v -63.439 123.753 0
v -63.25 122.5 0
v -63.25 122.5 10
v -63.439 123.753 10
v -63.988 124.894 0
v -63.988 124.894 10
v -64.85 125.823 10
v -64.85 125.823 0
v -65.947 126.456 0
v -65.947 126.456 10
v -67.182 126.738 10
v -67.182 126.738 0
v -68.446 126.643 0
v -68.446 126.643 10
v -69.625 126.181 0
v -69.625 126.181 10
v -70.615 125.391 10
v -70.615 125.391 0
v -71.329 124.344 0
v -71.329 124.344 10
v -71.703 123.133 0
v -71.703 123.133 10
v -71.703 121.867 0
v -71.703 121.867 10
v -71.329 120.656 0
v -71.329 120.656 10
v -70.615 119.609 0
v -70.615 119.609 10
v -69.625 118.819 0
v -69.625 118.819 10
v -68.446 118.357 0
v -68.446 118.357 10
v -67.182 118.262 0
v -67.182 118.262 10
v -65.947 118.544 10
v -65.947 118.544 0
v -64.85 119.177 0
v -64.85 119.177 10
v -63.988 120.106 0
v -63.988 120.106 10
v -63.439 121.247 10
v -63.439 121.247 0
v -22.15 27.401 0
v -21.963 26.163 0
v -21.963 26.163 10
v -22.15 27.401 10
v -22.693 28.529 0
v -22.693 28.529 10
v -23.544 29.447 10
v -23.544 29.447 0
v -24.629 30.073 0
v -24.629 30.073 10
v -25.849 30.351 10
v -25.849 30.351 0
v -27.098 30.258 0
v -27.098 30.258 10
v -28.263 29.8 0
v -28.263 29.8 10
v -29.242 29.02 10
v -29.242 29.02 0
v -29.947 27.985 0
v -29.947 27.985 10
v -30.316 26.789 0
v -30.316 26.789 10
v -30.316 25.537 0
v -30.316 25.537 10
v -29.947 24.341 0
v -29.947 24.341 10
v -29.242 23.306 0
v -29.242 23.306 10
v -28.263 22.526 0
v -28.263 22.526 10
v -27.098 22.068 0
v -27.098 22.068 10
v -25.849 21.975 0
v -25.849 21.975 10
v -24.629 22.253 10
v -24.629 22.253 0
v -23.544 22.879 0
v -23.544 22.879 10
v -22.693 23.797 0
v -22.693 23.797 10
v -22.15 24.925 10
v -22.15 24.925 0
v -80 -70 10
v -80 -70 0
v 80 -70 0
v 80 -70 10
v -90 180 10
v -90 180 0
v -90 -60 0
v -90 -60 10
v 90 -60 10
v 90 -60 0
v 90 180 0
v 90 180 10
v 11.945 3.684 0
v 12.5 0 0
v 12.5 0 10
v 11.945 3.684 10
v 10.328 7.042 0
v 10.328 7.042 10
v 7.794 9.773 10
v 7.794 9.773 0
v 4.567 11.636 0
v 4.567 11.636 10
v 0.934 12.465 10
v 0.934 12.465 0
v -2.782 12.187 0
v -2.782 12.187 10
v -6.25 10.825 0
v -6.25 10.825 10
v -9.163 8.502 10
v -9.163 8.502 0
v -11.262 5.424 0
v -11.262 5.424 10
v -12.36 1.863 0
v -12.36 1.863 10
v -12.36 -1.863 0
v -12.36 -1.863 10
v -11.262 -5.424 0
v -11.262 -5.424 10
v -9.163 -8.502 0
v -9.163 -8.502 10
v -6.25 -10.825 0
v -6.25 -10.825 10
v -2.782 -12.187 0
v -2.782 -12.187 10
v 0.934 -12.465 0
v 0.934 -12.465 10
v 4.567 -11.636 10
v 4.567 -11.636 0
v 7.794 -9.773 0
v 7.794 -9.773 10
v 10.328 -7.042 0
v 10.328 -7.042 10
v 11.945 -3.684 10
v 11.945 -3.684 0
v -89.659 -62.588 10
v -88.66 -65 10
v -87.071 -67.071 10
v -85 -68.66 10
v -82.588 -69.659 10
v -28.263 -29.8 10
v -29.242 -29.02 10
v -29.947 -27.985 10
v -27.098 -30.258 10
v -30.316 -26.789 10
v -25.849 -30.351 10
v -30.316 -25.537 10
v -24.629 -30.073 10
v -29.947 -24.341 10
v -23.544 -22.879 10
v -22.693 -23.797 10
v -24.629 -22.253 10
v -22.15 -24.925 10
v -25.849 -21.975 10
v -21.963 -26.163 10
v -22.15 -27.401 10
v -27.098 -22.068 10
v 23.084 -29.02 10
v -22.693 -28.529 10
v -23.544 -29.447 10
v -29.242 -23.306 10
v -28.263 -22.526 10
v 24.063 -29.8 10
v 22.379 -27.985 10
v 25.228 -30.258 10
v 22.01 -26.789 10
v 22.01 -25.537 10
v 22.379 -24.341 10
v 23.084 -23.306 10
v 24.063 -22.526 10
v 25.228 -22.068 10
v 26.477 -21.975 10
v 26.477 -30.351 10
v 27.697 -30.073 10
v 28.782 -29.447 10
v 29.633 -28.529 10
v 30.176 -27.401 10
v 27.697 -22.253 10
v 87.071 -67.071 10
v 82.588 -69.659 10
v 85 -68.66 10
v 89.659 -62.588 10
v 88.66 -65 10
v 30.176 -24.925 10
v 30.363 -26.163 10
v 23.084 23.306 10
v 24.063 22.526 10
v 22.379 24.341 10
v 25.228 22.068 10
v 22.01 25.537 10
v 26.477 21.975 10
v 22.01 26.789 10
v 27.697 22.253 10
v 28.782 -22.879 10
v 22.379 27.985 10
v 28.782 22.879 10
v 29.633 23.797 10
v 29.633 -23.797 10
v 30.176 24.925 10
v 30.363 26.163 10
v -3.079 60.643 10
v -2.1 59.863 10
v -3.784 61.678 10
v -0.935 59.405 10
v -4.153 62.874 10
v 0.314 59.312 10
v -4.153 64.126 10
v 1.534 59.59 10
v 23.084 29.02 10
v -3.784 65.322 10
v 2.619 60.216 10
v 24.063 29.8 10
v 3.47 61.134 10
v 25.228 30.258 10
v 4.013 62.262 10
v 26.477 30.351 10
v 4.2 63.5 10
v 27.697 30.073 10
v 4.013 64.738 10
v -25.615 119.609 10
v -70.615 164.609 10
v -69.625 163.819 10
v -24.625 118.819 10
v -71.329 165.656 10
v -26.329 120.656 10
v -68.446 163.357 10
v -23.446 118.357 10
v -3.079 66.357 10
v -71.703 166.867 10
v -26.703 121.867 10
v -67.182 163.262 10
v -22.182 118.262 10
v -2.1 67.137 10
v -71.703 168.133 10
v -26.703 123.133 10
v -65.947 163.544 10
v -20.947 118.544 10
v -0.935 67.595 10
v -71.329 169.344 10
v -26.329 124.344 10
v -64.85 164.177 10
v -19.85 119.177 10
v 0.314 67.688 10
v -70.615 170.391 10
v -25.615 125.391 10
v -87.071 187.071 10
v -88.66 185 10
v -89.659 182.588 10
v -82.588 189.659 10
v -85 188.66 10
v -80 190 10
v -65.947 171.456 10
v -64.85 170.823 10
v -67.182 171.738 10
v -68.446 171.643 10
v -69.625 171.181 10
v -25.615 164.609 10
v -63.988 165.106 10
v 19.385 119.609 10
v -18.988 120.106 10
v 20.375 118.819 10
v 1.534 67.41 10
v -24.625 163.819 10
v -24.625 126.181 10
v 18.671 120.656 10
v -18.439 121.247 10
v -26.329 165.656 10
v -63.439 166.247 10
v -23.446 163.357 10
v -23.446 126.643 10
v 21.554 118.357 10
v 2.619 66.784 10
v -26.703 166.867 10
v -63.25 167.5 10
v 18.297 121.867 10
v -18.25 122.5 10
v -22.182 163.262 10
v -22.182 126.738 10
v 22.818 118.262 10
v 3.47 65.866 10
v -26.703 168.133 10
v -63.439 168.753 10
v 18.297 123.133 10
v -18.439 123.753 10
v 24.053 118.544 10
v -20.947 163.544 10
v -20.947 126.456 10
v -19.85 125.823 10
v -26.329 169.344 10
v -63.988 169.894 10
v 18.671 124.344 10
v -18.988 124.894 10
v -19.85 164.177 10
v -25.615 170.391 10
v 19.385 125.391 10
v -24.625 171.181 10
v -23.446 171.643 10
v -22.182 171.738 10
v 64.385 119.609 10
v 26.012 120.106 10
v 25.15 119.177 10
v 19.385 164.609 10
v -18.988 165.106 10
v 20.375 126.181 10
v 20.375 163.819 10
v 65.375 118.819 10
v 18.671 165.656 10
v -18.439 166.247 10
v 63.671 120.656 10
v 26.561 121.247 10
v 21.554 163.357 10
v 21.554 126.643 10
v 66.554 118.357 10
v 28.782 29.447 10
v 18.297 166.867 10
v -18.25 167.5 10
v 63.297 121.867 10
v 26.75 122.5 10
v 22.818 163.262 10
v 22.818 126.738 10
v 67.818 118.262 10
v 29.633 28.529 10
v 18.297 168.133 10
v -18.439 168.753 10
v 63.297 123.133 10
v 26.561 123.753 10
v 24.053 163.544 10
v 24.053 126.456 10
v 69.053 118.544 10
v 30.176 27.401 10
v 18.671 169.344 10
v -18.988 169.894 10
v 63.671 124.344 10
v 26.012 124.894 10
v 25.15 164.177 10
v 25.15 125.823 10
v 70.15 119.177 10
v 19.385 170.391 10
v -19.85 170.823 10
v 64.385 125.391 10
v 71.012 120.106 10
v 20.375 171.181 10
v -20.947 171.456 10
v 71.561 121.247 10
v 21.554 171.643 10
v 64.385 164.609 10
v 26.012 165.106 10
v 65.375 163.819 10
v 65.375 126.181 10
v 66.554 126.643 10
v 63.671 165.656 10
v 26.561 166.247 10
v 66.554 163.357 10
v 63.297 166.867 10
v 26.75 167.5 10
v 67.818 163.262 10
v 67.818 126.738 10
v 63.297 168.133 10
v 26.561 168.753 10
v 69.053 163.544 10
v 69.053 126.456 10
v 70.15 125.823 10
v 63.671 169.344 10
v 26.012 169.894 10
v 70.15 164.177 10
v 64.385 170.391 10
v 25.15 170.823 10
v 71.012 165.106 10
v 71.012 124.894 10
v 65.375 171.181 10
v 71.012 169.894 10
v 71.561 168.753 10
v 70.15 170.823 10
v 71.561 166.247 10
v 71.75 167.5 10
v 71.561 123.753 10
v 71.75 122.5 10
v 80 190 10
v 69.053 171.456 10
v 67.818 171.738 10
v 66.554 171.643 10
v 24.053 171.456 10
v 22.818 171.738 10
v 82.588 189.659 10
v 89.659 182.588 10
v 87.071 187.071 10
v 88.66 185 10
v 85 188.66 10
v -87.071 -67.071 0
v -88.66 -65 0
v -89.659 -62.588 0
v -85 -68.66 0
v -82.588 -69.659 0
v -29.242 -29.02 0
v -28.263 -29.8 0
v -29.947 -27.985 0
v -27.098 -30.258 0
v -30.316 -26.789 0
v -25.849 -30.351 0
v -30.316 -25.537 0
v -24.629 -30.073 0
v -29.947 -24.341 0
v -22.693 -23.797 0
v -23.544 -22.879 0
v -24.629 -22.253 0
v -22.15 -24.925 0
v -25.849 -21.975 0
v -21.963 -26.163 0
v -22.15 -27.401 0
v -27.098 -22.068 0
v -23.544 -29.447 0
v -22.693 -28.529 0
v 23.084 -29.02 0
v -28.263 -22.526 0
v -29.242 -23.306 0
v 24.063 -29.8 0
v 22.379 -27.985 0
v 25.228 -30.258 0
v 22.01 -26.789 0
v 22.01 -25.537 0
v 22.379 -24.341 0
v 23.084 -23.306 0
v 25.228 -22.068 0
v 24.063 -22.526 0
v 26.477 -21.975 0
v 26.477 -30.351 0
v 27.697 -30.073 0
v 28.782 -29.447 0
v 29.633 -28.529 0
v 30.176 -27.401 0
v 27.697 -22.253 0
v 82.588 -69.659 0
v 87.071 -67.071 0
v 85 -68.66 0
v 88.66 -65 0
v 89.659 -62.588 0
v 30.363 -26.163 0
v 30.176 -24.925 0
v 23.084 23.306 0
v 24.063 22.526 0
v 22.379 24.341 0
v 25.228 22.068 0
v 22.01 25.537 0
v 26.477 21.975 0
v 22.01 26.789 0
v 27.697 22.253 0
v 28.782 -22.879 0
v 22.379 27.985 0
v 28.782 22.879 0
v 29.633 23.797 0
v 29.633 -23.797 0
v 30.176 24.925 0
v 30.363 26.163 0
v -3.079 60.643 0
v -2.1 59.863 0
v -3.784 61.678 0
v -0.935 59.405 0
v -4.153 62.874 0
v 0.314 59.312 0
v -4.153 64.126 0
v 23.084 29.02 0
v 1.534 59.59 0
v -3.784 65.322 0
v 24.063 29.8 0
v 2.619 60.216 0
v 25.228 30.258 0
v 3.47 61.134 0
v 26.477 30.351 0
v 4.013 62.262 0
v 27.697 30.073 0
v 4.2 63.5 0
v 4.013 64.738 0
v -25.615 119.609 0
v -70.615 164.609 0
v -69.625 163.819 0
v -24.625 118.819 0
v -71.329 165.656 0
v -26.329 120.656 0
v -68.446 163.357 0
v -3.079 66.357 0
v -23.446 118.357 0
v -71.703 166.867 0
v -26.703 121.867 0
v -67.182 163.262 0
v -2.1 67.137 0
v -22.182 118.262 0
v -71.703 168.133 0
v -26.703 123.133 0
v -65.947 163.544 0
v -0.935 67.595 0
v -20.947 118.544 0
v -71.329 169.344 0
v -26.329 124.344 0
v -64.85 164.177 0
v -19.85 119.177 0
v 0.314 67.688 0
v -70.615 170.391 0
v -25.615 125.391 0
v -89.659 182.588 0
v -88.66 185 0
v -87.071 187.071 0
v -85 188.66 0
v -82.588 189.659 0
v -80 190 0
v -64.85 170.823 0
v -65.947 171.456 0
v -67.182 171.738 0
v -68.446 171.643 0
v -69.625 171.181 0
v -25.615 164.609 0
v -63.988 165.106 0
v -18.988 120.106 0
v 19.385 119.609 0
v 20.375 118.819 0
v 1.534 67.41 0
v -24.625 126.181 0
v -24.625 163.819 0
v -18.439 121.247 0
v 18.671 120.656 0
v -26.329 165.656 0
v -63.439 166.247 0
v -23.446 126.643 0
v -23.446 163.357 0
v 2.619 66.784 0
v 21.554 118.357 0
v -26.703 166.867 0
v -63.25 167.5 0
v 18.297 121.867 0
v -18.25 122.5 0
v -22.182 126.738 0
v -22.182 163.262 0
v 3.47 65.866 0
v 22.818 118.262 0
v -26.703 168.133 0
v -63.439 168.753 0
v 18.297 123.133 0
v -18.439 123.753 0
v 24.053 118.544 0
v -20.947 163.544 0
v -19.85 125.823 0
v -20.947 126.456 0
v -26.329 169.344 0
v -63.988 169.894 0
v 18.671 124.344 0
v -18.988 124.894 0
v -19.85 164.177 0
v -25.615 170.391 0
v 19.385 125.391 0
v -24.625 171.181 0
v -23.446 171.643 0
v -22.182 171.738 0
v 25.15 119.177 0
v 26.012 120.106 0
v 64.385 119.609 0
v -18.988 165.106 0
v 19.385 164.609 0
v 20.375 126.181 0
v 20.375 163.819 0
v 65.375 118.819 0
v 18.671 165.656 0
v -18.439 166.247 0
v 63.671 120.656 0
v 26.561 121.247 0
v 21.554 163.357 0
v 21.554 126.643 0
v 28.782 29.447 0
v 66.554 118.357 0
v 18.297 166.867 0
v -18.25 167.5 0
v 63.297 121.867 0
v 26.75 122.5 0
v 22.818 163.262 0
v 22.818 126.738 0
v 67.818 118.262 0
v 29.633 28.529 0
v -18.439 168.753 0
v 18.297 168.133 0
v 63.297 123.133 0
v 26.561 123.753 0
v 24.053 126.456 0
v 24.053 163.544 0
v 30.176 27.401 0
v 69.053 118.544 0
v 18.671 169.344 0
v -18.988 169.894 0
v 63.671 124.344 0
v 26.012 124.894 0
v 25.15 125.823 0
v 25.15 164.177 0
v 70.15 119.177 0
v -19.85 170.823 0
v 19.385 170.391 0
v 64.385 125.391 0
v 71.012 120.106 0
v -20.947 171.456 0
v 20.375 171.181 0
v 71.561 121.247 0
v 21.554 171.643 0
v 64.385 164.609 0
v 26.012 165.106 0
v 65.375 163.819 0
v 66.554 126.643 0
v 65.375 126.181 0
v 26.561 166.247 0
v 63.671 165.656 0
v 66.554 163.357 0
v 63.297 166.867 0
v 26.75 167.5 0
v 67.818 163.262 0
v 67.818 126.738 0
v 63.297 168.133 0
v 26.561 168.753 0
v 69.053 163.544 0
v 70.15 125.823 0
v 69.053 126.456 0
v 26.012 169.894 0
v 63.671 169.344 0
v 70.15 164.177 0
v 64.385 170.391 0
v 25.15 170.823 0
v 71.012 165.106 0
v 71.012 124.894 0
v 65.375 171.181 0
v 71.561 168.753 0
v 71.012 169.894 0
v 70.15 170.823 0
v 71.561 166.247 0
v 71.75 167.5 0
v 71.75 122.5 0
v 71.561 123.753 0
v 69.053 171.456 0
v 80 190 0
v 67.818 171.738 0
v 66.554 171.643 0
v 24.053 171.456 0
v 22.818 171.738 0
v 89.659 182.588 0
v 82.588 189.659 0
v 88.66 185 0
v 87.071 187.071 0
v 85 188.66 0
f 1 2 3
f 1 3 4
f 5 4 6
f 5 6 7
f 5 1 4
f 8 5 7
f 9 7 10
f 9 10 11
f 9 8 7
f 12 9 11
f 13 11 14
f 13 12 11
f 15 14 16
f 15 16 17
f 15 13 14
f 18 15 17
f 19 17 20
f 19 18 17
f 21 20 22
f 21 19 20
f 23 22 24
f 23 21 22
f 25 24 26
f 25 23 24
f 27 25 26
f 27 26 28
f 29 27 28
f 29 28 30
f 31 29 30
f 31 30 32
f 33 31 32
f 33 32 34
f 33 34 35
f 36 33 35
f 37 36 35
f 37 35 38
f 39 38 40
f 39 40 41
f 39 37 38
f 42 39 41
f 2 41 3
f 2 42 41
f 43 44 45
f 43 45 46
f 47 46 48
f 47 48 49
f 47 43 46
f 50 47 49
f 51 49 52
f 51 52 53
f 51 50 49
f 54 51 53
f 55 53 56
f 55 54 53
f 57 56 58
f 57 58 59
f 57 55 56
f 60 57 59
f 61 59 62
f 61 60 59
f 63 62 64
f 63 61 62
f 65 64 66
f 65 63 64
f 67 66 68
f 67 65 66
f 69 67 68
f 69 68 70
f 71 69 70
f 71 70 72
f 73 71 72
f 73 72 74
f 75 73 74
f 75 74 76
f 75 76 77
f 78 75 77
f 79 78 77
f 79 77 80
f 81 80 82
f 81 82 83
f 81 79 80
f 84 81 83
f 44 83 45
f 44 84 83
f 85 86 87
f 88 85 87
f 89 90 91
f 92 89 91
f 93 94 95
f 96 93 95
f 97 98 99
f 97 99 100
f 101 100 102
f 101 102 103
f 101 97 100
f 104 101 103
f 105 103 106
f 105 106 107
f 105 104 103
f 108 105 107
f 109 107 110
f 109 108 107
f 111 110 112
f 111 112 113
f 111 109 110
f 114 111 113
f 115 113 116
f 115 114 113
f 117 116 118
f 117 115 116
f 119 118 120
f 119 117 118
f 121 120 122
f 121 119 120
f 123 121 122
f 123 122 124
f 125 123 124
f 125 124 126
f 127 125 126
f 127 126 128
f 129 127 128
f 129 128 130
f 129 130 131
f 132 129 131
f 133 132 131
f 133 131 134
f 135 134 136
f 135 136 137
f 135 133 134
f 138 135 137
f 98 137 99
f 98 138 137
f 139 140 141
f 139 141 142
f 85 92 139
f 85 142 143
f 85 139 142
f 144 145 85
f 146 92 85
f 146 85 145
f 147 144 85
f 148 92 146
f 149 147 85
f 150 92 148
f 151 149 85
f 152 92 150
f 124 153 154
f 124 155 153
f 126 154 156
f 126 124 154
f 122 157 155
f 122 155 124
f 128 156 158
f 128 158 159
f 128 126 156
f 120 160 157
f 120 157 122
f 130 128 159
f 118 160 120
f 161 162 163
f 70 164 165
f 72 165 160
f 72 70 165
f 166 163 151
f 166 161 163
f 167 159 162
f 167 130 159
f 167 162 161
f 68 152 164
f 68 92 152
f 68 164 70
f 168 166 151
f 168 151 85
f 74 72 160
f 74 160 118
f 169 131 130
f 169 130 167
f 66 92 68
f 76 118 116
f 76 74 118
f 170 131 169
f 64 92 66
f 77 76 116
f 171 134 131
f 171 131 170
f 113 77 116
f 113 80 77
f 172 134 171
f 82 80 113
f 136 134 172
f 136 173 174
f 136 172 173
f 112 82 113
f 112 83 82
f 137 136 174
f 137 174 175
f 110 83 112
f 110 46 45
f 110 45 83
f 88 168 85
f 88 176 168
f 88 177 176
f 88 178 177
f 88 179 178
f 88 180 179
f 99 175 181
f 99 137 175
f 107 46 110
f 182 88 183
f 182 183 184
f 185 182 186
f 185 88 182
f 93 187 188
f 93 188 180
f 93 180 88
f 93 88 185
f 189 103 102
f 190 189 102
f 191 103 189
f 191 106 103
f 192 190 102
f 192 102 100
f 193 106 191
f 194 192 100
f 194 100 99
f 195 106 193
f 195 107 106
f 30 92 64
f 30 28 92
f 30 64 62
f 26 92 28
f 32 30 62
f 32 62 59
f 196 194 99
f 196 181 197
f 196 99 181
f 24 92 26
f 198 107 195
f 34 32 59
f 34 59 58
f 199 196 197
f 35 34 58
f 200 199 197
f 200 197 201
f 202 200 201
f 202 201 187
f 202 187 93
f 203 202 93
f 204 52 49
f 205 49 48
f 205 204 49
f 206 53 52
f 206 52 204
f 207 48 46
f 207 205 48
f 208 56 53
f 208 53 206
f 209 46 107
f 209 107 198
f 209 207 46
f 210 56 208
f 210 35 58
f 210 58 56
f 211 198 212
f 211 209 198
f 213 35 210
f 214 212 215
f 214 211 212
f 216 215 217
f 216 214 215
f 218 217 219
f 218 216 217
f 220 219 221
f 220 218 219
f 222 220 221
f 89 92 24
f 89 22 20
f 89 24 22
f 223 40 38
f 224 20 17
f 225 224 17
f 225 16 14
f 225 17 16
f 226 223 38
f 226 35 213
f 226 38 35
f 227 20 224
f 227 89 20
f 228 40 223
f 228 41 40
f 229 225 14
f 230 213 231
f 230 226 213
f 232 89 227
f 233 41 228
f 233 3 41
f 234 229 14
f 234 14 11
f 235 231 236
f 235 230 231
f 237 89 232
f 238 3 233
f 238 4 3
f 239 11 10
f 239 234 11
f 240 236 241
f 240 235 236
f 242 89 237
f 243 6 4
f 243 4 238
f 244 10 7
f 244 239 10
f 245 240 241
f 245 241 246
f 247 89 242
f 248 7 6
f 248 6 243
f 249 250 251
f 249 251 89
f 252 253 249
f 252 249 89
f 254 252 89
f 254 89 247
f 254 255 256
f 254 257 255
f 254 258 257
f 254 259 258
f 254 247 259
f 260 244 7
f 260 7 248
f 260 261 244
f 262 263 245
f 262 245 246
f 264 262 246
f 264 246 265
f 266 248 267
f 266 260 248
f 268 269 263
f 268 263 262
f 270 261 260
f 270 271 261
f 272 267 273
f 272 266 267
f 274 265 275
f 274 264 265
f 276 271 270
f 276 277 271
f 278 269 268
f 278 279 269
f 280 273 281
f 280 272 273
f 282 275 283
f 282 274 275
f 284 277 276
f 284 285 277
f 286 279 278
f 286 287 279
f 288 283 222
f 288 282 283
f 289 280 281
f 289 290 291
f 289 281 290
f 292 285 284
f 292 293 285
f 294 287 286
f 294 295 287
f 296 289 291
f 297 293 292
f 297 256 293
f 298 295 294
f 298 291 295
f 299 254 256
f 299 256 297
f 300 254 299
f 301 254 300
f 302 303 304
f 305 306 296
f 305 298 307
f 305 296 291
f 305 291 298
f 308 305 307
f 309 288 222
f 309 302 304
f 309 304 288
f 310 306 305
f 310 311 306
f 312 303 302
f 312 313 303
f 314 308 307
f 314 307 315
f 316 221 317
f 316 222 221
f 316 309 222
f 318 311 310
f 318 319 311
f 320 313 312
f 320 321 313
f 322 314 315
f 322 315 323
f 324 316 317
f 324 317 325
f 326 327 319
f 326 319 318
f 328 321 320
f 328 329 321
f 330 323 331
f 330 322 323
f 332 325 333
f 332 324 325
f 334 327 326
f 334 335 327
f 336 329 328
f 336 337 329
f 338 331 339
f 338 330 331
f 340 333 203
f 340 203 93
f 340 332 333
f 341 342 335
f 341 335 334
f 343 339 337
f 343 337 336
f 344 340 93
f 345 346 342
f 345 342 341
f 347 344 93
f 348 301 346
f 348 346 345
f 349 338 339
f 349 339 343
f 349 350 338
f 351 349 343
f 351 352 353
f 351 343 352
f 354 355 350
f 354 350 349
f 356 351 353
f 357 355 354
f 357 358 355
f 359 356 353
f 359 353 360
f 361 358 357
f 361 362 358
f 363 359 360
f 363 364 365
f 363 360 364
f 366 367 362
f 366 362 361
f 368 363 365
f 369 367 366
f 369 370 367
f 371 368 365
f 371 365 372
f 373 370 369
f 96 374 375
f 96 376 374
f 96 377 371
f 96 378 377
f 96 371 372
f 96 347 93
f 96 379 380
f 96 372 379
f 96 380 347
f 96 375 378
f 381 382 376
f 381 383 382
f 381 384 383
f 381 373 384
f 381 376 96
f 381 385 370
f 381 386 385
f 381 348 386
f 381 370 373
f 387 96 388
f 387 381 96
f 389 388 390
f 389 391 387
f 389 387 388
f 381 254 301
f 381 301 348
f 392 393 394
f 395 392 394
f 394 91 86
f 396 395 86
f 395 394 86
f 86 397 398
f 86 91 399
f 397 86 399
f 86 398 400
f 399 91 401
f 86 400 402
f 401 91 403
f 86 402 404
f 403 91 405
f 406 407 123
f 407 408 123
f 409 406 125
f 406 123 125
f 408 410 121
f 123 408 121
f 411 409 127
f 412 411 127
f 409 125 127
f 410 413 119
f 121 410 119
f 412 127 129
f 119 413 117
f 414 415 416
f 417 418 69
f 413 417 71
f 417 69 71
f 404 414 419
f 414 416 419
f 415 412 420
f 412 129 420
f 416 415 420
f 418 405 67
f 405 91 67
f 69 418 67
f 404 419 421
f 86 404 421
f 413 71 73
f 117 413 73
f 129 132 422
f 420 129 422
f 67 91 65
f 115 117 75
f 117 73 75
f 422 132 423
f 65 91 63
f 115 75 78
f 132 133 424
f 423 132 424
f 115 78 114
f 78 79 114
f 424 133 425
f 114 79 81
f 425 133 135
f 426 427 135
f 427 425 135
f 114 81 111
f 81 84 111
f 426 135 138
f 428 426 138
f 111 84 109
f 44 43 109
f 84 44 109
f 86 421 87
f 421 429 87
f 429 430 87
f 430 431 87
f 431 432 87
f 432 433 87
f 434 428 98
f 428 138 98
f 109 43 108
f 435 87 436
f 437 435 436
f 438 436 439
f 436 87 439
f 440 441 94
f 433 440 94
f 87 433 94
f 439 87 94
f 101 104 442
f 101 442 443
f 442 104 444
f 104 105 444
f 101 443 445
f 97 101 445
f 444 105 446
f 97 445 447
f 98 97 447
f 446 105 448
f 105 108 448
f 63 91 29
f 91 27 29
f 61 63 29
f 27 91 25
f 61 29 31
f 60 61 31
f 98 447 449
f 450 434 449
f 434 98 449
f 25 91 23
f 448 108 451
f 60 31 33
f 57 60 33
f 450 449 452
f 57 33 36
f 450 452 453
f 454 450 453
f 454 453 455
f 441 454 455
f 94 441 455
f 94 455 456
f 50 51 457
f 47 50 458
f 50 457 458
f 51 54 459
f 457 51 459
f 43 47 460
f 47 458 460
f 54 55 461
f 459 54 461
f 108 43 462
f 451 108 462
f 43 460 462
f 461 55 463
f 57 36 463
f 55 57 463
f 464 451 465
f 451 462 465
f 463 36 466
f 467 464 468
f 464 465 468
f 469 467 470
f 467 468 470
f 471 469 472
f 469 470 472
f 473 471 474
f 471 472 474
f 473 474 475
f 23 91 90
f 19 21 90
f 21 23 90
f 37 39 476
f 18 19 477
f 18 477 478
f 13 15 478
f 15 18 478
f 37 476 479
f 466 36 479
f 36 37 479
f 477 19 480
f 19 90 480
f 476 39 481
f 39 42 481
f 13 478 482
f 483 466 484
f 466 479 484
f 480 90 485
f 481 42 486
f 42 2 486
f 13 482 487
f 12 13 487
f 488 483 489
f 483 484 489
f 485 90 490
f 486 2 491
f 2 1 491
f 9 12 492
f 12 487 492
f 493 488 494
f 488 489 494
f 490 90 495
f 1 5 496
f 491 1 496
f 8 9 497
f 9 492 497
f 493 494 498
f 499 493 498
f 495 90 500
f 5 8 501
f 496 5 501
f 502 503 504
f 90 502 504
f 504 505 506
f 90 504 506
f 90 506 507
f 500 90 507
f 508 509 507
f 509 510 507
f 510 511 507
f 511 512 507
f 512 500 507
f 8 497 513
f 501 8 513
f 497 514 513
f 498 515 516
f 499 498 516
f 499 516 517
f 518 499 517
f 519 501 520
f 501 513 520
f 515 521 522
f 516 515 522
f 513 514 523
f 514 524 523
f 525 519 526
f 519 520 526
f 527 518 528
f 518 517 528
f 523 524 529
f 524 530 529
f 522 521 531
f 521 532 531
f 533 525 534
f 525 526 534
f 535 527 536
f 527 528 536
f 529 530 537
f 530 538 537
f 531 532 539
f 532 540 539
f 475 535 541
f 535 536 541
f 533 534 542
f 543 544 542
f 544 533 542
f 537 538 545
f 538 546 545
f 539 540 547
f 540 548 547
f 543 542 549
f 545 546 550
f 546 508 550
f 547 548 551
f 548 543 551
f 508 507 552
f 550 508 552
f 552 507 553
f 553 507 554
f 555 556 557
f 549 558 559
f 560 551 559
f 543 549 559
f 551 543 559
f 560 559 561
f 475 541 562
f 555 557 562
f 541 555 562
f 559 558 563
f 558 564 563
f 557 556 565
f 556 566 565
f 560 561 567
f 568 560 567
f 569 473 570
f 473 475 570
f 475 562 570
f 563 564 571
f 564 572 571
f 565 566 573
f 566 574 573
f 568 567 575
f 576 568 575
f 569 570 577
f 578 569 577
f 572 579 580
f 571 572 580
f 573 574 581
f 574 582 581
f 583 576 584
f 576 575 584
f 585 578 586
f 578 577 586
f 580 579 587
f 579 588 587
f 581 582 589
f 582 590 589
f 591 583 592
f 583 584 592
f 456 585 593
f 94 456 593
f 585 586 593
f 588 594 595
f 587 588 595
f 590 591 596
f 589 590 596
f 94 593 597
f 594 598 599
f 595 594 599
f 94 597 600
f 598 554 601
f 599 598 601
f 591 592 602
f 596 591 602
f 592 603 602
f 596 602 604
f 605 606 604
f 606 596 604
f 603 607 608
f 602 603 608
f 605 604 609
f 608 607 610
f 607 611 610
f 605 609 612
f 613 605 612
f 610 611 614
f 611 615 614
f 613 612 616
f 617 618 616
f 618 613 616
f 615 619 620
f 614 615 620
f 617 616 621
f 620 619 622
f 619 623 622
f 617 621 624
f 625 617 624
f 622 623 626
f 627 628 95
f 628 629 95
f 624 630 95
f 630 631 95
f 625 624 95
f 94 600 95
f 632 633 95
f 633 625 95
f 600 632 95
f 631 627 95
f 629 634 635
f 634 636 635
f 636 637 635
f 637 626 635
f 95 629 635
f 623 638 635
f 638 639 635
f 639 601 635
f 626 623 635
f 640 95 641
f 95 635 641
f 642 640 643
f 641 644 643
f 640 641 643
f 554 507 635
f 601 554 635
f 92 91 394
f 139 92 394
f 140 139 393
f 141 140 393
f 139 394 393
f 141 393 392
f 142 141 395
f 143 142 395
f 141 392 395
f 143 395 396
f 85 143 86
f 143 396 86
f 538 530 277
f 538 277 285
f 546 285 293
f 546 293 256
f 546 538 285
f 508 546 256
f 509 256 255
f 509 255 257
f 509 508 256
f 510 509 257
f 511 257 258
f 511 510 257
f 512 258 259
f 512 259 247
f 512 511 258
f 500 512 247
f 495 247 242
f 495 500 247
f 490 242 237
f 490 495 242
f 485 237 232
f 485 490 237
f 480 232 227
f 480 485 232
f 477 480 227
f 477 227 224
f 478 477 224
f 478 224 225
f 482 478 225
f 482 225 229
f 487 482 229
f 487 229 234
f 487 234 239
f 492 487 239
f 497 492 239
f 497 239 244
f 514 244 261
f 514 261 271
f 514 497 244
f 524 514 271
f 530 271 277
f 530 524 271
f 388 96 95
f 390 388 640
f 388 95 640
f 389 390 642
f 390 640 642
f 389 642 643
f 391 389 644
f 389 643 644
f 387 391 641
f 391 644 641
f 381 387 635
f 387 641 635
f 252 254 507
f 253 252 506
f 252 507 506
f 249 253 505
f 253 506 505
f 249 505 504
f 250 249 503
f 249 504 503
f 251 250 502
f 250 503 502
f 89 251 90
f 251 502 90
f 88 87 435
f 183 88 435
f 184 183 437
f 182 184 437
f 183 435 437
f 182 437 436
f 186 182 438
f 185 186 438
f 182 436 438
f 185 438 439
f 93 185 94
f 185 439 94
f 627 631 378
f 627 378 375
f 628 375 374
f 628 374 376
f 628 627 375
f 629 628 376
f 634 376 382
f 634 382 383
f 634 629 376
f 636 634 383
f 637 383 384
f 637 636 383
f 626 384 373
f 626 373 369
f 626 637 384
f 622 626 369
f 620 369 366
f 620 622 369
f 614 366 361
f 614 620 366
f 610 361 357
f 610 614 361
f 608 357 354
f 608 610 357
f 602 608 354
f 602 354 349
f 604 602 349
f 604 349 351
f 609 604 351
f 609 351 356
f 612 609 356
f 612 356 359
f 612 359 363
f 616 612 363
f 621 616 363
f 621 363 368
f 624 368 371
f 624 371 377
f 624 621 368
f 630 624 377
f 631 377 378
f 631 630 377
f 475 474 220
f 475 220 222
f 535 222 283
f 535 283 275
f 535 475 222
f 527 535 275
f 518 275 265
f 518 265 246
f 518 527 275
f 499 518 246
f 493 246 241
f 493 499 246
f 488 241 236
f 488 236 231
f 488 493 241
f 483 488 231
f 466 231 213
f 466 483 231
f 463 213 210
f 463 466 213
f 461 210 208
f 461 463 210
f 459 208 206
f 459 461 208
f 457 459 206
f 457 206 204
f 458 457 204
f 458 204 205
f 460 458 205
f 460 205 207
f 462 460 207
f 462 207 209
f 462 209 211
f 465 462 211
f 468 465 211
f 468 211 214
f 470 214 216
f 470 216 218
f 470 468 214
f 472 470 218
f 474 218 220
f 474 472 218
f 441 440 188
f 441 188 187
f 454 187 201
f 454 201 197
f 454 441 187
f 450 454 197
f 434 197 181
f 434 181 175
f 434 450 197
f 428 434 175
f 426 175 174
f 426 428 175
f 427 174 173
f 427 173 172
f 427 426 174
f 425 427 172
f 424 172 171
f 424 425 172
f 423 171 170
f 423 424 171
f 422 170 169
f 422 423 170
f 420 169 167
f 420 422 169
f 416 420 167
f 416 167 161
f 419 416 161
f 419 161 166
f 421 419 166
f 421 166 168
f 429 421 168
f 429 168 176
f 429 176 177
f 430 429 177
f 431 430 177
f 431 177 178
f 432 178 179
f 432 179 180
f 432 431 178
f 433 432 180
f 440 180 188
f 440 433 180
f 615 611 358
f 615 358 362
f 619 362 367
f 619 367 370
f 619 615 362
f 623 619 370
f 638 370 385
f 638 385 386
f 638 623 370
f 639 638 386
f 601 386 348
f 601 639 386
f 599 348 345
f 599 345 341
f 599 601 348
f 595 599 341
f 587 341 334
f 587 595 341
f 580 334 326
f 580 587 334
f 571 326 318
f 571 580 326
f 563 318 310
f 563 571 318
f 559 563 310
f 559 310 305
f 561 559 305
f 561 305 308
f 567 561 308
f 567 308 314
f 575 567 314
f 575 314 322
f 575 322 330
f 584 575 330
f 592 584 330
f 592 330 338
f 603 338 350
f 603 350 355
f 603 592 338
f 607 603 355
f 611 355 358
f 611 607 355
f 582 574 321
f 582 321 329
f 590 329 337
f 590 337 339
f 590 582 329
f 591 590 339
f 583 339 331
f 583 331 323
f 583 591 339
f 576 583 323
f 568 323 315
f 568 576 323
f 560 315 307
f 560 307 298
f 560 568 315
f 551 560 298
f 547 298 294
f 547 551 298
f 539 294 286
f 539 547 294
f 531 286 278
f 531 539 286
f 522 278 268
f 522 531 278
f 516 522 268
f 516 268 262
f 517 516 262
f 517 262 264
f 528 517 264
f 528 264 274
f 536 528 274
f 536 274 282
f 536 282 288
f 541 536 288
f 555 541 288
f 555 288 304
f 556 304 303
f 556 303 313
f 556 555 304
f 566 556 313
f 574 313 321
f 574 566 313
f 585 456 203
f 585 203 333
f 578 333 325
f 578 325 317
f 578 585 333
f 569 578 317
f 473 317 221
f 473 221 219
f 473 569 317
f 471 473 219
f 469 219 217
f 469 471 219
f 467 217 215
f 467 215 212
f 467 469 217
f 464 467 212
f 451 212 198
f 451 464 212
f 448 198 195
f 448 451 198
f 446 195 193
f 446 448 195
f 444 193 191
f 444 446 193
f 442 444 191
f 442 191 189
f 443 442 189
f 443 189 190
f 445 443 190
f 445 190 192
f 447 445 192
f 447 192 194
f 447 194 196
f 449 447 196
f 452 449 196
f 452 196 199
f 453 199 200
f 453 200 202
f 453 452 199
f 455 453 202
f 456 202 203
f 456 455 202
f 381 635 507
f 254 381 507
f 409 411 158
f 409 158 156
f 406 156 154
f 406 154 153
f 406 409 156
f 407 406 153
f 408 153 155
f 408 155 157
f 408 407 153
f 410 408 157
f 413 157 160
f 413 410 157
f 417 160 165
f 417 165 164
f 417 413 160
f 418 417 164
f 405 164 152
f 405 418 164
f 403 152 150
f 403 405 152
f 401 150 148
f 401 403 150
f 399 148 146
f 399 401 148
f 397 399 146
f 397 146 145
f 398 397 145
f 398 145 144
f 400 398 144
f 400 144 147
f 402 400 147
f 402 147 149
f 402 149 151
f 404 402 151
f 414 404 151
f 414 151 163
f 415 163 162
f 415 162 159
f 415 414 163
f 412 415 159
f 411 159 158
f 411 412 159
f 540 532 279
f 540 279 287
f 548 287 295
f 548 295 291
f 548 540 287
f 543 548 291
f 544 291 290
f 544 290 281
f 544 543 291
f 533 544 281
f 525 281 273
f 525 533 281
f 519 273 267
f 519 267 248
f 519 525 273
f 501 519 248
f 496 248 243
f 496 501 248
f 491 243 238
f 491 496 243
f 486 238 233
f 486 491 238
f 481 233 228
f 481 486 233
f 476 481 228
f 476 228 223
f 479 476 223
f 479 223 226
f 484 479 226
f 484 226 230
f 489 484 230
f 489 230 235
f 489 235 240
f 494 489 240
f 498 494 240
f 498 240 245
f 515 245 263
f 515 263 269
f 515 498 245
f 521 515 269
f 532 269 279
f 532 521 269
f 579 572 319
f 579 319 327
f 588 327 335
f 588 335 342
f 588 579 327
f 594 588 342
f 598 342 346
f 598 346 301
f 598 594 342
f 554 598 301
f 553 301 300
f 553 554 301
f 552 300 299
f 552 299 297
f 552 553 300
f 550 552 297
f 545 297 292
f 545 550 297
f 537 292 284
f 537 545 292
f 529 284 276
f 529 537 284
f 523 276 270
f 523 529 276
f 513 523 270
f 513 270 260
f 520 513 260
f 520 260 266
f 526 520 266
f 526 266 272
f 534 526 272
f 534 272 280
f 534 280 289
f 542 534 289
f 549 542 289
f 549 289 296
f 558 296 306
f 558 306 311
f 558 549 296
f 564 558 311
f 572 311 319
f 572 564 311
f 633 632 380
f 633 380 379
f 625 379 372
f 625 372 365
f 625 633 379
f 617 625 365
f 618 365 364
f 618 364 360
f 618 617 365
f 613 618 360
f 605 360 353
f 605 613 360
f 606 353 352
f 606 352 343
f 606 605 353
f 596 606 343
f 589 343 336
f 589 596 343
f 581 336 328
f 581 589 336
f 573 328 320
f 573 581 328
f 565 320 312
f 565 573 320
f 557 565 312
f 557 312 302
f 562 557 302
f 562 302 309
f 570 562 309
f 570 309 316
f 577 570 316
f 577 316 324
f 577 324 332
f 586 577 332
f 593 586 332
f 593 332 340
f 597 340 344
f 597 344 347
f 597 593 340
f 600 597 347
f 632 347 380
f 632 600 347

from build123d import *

# Parameters (mm, degrees)
SKETCH1_R           = 4.2
SKETCH1_R_2         = 4.25
SKETCH1_R_3         = 12.5
BOSS_EXTRUDE1_DEPTH = 10


with BuildPart() as part:
    # Sketch1 → Boss-Extrude1 (new body)
    with BuildSketch(Plane.XY):
        with BuildLine():
            Line((-80, -70), (80, -70))
            ThreePointArc((80, -70), (87.071067812, -67.071067812), (90, -60))
            Line((90, -60), (90, 180))
            ThreePointArc((90, 180), (87.071067812, 187.071067812), (80, 190))
            Line((80, 190), (-80, 190))
            ThreePointArc((-80, 190), (-87.071067812, 187.071067812), (-90, 180))
            Line((-90, 180), (-90, -60))
            ThreePointArc((-90, -60), (-87.071067812, -67.071067812), (-80, -70))
        make_face()
        with Locations((26.162950904, 26.162950904)):
            Circle(SKETCH1_R, mode=Mode.SUBTRACT)
        with Locations((26.162950904, -26.162950904)):
            Circle(SKETCH1_R, mode=Mode.SUBTRACT)
        with Locations((-26.162950904, -26.162950904)):
            Circle(SKETCH1_R, mode=Mode.SUBTRACT)
        with Locations((-26.162950904, 26.162950904)):
            Circle(SKETCH1_R, mode=Mode.SUBTRACT)
        with Locations((0, 63.5)):
            Circle(SKETCH1_R, mode=Mode.SUBTRACT)
        with Locations((-67.5, 167.5)):
            Circle(SKETCH1_R_2, mode=Mode.SUBTRACT)
        with Locations((-67.5, 122.5)):
            Circle(SKETCH1_R_2, mode=Mode.SUBTRACT)
        with Locations((-22.5, 122.5)):
            Circle(SKETCH1_R_2, mode=Mode.SUBTRACT)
        with Locations((-22.5, 167.5)):
            Circle(SKETCH1_R_2, mode=Mode.SUBTRACT)
        with Locations((22.5, 122.5)):
            Circle(SKETCH1_R_2, mode=Mode.SUBTRACT)
        with Locations((22.5, 167.5)):
            Circle(SKETCH1_R_2, mode=Mode.SUBTRACT)
        with Locations((67.5, 122.5)):
            Circle(SKETCH1_R_2, mode=Mode.SUBTRACT)
        with Locations((67.5, 167.5)):
            Circle(SKETCH1_R_2, mode=Mode.SUBTRACT)
        Circle(SKETCH1_R_3, mode=Mode.SUBTRACT)
    extrude(amount=BOSS_EXTRUDE1_DEPTH)


solid = part.part
